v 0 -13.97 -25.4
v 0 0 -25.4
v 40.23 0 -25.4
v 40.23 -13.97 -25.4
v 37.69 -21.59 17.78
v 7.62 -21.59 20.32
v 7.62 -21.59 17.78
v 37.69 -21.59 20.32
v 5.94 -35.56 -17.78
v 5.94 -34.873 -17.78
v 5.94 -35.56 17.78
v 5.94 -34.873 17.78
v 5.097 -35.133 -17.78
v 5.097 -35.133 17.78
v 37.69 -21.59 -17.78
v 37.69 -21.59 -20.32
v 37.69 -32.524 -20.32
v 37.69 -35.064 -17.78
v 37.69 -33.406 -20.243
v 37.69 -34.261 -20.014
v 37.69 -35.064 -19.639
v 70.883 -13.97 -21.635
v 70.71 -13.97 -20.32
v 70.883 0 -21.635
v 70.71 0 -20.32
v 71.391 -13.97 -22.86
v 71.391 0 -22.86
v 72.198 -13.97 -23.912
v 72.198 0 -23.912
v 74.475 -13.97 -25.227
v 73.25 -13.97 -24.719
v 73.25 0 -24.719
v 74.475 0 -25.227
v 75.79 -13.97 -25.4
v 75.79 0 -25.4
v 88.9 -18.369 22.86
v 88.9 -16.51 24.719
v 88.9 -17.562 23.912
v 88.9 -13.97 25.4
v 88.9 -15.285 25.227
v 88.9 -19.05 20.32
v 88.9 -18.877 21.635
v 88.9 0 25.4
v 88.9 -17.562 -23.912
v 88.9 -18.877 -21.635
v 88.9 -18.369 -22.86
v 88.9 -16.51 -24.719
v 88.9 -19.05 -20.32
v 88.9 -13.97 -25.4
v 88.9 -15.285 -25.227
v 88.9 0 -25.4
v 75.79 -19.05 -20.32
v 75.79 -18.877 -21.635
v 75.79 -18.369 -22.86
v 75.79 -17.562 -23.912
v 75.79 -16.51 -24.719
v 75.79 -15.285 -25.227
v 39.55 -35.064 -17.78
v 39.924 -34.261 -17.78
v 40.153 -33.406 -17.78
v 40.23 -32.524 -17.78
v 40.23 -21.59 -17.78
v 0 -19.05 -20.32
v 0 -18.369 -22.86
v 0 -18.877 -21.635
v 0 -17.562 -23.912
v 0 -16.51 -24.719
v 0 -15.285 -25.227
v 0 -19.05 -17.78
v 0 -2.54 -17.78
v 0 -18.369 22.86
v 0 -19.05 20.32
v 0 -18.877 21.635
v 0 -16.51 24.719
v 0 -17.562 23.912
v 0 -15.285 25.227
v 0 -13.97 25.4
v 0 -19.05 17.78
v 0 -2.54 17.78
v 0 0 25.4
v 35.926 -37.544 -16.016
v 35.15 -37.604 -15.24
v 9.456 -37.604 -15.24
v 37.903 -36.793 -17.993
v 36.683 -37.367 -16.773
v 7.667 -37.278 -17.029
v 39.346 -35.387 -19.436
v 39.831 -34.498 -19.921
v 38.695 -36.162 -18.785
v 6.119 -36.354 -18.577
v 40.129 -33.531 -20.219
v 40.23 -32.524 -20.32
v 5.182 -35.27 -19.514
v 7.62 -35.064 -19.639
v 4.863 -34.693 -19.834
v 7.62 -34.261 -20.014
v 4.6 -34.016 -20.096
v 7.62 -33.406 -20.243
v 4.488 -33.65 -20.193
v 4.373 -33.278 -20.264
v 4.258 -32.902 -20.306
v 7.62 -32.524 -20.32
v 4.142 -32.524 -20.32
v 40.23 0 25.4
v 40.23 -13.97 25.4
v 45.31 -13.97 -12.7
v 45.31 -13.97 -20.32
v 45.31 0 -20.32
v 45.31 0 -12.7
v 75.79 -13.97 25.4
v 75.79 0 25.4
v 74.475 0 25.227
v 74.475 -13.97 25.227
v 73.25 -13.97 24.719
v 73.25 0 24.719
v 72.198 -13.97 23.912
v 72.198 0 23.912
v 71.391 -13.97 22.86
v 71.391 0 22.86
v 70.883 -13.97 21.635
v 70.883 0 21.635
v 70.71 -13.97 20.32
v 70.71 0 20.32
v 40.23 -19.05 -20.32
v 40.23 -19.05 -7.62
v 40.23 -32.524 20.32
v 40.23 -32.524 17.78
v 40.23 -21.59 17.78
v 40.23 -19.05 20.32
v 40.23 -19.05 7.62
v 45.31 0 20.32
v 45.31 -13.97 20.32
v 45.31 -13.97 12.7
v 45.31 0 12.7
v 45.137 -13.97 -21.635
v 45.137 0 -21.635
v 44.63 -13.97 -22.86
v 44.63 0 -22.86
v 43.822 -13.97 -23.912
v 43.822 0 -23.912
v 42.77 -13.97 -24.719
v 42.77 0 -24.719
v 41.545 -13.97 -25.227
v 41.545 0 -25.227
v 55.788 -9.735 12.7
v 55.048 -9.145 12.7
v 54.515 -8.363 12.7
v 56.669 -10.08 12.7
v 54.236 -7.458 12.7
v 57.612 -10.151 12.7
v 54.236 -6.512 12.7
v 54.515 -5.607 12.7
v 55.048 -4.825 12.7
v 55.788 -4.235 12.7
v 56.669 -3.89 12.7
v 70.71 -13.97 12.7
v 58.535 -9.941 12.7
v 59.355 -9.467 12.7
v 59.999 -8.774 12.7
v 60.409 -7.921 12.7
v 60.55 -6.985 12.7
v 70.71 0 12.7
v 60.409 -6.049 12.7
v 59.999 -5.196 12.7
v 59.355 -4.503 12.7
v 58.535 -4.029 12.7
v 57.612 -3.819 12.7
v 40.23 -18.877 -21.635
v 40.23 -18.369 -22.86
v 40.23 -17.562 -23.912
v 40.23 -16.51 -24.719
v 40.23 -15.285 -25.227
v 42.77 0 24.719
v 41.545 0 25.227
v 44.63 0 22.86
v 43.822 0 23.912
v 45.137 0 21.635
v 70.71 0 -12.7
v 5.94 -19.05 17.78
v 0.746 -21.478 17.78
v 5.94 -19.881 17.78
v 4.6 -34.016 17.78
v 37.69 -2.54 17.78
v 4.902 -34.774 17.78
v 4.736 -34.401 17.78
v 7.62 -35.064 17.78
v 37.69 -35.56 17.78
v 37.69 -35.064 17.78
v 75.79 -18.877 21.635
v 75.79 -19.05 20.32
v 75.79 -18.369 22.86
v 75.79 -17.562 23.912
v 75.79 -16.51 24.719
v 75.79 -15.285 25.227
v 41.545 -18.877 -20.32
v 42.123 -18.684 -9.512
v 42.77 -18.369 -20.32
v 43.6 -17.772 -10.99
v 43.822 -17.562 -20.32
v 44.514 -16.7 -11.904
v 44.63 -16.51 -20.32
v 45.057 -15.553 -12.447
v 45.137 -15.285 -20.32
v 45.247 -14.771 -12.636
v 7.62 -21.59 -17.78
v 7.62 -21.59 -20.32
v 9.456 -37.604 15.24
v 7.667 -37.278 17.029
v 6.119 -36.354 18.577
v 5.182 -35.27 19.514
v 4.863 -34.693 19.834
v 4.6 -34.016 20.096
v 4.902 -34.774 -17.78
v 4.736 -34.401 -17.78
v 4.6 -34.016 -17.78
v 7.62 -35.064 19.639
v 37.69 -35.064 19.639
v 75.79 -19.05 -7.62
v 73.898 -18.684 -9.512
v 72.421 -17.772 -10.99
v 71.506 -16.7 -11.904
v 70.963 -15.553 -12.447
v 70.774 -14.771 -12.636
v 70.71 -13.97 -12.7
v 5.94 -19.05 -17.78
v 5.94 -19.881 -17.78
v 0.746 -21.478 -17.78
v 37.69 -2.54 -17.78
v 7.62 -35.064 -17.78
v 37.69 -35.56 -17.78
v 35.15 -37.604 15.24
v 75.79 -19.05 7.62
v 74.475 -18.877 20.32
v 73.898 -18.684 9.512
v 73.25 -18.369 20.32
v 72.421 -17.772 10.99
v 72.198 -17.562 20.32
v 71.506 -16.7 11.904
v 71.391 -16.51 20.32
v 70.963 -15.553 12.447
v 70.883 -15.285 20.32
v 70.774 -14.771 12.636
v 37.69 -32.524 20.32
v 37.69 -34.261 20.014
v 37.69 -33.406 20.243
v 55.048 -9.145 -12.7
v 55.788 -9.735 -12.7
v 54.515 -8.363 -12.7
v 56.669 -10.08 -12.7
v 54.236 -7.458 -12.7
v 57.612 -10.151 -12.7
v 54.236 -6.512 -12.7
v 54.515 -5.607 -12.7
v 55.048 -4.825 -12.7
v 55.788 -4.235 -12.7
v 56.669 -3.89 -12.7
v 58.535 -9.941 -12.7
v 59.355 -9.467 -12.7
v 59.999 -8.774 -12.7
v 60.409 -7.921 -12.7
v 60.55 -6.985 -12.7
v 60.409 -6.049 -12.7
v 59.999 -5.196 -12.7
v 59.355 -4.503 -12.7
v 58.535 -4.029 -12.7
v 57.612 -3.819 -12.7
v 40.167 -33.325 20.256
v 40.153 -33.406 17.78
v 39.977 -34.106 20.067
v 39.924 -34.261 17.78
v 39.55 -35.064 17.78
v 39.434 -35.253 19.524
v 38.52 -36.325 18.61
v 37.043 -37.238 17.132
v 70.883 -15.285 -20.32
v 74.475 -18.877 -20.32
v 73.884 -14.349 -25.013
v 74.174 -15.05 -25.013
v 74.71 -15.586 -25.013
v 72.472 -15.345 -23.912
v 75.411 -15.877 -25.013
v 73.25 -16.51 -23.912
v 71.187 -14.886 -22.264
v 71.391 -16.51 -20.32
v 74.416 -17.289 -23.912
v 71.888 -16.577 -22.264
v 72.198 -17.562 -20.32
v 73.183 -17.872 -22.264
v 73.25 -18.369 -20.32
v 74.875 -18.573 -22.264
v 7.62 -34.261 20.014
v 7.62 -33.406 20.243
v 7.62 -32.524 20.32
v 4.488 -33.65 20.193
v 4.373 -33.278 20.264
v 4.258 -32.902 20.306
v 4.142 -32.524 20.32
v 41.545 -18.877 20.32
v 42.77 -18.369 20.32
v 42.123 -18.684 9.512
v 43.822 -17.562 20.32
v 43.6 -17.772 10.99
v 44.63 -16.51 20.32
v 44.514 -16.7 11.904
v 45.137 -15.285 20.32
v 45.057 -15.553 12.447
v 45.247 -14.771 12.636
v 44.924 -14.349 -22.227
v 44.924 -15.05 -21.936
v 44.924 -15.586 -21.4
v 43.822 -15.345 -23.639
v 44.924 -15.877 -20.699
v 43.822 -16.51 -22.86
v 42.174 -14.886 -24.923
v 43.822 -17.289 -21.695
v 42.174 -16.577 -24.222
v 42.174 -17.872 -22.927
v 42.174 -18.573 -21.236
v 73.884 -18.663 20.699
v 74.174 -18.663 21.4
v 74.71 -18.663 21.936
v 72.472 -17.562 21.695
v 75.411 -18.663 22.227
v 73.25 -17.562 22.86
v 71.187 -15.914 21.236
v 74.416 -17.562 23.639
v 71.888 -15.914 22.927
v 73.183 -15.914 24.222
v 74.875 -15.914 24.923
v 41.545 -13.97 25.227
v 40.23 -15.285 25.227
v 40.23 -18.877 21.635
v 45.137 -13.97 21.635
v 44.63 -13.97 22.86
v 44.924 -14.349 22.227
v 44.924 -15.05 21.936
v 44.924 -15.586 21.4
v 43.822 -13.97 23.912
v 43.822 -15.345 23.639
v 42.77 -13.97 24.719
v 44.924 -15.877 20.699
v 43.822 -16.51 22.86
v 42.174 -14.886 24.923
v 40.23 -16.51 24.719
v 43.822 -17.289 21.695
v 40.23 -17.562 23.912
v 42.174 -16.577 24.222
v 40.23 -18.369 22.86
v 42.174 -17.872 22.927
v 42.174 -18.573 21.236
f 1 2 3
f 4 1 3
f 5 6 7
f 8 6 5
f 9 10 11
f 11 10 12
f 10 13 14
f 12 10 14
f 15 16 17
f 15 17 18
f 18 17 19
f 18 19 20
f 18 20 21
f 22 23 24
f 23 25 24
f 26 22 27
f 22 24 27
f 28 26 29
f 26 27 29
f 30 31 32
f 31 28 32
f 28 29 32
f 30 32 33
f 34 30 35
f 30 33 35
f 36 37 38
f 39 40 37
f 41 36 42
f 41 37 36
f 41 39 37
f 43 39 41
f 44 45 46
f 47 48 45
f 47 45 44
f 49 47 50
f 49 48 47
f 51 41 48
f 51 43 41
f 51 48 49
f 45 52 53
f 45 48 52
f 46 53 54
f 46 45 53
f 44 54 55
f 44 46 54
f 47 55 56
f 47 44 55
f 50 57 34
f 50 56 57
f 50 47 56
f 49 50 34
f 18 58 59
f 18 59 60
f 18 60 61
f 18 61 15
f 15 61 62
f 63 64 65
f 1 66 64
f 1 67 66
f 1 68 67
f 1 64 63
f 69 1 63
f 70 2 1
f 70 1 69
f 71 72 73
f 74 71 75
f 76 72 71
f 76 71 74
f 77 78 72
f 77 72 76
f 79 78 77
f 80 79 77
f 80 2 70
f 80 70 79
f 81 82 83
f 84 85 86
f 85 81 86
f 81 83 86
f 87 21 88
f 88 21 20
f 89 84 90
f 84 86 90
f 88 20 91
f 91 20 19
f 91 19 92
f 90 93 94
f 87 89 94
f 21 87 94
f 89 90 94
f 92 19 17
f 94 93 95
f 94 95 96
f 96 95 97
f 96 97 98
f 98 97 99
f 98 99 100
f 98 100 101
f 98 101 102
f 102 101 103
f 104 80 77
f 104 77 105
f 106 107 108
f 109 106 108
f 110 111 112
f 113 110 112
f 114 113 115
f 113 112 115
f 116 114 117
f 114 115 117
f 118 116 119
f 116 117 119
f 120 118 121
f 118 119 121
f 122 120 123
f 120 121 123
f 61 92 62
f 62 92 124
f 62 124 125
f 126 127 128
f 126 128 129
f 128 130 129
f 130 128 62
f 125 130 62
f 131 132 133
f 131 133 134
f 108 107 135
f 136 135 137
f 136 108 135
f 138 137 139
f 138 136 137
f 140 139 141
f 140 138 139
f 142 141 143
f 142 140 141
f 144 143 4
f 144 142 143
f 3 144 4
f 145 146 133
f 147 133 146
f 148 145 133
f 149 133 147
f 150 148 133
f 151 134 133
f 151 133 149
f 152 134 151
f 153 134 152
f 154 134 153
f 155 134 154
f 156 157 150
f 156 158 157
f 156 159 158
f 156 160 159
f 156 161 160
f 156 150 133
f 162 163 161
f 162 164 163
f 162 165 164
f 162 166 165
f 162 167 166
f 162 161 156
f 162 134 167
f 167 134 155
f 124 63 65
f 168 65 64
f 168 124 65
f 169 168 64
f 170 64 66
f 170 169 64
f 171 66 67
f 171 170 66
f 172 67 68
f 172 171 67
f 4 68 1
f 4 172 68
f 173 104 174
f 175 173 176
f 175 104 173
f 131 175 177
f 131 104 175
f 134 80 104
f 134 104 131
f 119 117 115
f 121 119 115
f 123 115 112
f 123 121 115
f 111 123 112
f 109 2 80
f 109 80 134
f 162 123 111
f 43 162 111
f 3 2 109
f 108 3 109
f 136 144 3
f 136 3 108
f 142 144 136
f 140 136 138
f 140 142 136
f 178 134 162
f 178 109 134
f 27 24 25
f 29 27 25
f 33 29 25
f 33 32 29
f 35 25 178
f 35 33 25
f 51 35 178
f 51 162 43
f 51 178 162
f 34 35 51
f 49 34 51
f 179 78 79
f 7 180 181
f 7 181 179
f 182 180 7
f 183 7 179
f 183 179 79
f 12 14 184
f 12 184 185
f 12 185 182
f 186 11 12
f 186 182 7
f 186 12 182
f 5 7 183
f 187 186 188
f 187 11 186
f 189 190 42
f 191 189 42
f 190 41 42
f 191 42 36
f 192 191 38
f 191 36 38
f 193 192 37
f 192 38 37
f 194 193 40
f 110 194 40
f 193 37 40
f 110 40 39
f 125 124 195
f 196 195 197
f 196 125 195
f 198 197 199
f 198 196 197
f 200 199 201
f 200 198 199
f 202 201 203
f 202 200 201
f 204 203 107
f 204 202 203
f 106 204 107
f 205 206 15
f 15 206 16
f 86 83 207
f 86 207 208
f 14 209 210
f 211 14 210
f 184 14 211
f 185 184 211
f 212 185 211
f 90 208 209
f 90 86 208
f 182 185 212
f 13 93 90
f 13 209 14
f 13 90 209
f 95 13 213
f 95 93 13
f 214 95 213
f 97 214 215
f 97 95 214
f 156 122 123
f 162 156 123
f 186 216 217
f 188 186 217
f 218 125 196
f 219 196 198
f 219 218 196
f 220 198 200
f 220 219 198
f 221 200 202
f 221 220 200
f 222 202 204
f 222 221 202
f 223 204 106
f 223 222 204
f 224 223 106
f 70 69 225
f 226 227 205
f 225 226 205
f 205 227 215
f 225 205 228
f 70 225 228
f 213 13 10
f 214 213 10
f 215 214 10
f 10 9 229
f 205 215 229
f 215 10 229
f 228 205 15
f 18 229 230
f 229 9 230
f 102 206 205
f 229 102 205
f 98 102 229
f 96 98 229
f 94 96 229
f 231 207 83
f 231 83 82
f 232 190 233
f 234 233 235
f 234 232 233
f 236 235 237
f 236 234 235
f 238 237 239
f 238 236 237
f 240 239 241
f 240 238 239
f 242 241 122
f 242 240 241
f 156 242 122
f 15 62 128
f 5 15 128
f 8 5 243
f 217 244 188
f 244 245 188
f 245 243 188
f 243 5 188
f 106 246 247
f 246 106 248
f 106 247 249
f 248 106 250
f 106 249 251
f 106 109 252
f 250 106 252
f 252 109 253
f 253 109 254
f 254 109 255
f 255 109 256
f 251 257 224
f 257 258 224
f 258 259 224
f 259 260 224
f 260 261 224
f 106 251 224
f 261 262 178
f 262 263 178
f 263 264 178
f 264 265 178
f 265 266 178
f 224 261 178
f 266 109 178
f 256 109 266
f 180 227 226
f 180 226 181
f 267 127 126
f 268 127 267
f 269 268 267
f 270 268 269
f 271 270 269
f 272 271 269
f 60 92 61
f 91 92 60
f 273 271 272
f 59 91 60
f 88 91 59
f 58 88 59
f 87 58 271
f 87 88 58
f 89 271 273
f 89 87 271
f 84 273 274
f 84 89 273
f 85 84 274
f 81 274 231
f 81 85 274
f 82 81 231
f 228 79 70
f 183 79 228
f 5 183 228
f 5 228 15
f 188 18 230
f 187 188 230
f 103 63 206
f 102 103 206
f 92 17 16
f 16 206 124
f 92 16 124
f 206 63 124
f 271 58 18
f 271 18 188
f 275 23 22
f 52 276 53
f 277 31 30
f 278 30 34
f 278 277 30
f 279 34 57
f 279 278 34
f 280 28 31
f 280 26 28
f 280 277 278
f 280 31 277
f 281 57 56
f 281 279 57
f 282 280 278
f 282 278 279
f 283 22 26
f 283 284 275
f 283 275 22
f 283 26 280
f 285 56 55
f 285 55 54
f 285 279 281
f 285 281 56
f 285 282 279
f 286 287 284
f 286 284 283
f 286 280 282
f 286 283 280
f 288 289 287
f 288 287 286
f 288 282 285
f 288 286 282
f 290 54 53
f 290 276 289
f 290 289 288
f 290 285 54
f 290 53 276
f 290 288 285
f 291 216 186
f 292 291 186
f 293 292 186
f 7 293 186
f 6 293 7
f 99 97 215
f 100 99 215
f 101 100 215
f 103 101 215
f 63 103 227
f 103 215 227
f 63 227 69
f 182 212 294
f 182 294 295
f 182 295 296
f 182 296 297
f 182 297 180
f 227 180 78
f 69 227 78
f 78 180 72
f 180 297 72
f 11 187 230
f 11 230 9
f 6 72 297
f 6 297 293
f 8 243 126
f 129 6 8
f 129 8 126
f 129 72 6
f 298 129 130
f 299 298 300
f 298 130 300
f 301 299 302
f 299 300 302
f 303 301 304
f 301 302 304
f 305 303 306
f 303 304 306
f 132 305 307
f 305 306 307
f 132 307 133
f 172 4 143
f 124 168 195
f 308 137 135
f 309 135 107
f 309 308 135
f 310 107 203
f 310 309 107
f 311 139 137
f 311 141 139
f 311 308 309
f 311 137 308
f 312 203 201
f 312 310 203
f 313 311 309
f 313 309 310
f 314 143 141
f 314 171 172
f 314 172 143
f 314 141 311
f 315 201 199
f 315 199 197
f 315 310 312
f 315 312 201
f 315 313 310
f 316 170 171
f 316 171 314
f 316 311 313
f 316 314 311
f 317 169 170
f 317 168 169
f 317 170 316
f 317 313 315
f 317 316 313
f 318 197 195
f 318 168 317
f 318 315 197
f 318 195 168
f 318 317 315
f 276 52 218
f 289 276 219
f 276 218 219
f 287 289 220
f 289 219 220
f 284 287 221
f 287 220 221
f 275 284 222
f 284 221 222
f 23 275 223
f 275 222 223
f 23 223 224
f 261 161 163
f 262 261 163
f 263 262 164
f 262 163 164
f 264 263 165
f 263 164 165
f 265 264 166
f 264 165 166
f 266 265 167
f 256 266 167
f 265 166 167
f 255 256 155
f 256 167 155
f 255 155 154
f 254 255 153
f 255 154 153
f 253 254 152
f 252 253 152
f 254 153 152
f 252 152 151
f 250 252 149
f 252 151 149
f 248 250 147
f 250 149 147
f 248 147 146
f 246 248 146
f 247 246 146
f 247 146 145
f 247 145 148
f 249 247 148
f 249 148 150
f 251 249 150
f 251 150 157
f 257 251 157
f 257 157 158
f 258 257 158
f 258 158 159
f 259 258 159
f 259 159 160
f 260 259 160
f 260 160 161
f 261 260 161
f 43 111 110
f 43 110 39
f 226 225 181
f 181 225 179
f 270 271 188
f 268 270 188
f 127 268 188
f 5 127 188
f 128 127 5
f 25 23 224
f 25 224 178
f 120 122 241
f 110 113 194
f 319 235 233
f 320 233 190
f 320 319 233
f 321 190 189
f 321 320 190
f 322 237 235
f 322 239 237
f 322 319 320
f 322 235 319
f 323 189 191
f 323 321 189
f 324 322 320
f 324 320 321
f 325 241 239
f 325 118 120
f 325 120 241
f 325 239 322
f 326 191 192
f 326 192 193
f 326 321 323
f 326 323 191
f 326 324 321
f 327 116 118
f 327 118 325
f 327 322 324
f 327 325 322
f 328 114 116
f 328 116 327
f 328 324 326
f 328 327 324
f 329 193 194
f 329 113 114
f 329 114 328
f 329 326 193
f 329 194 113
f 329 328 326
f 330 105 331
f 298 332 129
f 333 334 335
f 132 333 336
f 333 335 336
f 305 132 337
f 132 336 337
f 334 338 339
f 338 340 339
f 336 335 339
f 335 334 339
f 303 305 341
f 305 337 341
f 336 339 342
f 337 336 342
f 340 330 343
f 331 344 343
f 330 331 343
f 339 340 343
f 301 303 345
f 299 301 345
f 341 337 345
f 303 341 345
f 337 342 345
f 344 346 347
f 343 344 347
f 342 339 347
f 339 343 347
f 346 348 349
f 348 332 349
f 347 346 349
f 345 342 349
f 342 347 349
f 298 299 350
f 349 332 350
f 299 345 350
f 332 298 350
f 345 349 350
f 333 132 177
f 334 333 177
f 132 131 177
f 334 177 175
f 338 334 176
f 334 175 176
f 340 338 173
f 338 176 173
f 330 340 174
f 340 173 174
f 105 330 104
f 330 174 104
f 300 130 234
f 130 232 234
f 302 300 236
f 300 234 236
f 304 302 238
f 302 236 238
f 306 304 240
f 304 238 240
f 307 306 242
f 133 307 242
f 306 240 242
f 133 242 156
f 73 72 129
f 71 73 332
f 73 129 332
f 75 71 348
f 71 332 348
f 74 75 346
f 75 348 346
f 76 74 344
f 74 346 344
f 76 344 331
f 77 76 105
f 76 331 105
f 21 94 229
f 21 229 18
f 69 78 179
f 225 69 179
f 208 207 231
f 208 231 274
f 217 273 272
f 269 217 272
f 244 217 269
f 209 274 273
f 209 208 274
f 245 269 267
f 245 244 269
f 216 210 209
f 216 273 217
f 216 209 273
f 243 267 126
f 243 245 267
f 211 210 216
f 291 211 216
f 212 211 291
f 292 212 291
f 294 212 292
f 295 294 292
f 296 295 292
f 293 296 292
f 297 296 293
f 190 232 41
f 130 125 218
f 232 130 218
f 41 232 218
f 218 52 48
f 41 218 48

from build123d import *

# Parameters (mm, degrees)
F0_W         = 88.9
F0_H         = 25.4
F1_DEPTH     = 19.05
F2_W         = 25.4
F2_H         = 19.05
F3_DEPTH     = 12.7
F4_R         = 3.175
F5_DEPTH     = 12.7
F7_R         = 5.08
F8_W         = 37.6902104366
F8_H         = 35.56
F9_DEPTH     = 16.51
F10_W        = 40.2302104366
F10_H        = 40.64
F11_DEPTH    = 18.55363
F12_W        = 31.75
F12_H        = 35.56
F13_DEPTH    = 16.51
F14_W        = 30.0702104366
F14_H        = 13.47363
F15_DEPTH    = 2.54
F16_W        = 30.0702104366
F16_H        = 13.47363
F17_DEPTH    = 2.54
F19_DEPTH    = 50.8
F20_W        = 14.3303479189
F20_H        = 35.56
F21_DEPTH    = 7.62
F22_W        = 13.47363
F22_H        = 35.56
F23_DEPTH    = 5.08
F24_T1_DEPTH = 59.4053934524
F24_T3_DEPTH = 59.927191924
F24_T5_DEPTH = 66.04


# Not quite as in the source:
# - a fillet or chamfer that OpenCascade refuses, or shapes differently, is made with other operations: its cross-section is extruded or revolved along the edge and cut away or added


with BuildPart() as f1:
    # F0 (on Front) → F1 (new body)
    with BuildSketch(Plane.XZ):
        with Locations((44.45, 12.7)):
            Rectangle(F0_W, F0_H)
    extrude(amount=F1_DEPTH)

    # F2 (on face) → F3 (cut)
    with BuildSketch(Plane.XY.offset(25.4)):
        with Locations((58.0102104366, -9.525)):
            Rectangle(F2_W, F2_H)
    extrude(amount=-F3_DEPTH, mode=Mode.SUBTRACT)

    # F4 (on face) → F5 (cut)
    with BuildSketch(Plane.XY.offset(12.7)):
        with Locations((57.3752104366, -6.985)):
            Circle(F4_R)
    extrude(amount=-F5_DEPTH, mode=Mode.SUBTRACT)

    # F6: F1 across plane


with BuildPart() as f1_1:
    add(f1.part)
    add(f1.part.mirror(Plane.XY))

    # F7
    f7_edges = [f1_1.edges().sort_by_distance(p)[0] for p in [
        (22.655105, -19.05, -25.4),
        (22.655105, -19.05, 25.4),
        (45.31021, -9.525, -25.4),
        (45.31021, -19.05, -19.05),
        (70.71021, -19.05, -19.05),
        (70.71021, -9.525, -25.4),
        (70.71021, -9.525, 25.4),
        (70.71021, -19.05, 19.05),
        (45.31021, -9.525, 25.4),
        (45.31021, -19.05, 19.05),
        (58.01021, -19.05, -12.7),
        (58.01021, -19.05, 12.7),
        (79.805105, -19.05, -25.4),
        (79.805105, -19.05, 25.4),
    ]]
    fillet(f7_edges, radius=F7_R)

    # F8 (on face) → F9 (cut)
    with BuildSketch(Plane.XZ.offset(19.05)):
        with Locations((18.8451052183, 0)):
            Rectangle(F8_W, F8_H)
    extrude(amount=-F9_DEPTH, mode=Mode.SUBTRACT)

    # F10 (on face) → F11 (join)
    with BuildSketch(Plane.XZ.offset(19.05)):
        with Locations((20.1151052183, 0)):
            Rectangle(F10_W, F10_H)
    extrude(amount=F11_DEPTH)

    # F12 (on face) → F13 (cut)
    with BuildSketch(Plane(origin=(0, -19.05, 0), x_dir=(-1, 0, 0), z_dir=(0, 1, 0))):
        with Locations((-21.8152104366, 0)):
            Rectangle(F12_W, F12_H)
    extrude(amount=-F13_DEPTH, mode=Mode.SUBTRACT)

    # F14 (on face) → F15 (cut)
    with BuildSketch(Plane(origin=(0, 0, -20.32), x_dir=(1, 0, 0), z_dir=(0, 0, -1))):
        with Locations((22.6551052183, 28.326815)):
            Rectangle(F14_W, F14_H)
    extrude(amount=-F15_DEPTH, mode=Mode.SUBTRACT)

    # F16 (on face) → F17 (cut)
    with BuildSketch(Plane.XY.offset(20.32)):
        with Locations((22.6551052183, -28.326815)):
            Rectangle(F16_W, F16_H)
    extrude(amount=-F17_DEPTH, mode=Mode.SUBTRACT)

    # F18 (on face) → F19 (cut)
    with BuildSketch(Plane.XY.offset(20.32)):
        Polygon((0, -37.60363), (5.7030185126, -37.60363), (0, -19.05), align=None)
    extrude(amount=-F19_DEPTH, mode=Mode.SUBTRACT)

    # F20 (on face) → F21 (cut)
    with BuildSketch(Plane(origin=(-5.3501013979, -1.6445152413, 0), x_dir=(0.293813307, -0.9558628252, 0), z_dir=(-0.9558628252, -0.293813307, 0))):
        with Locations((27.9143607796, 0)):
            Rectangle(F20_W, F20_H)
    extrude(amount=-F21_DEPTH, mode=Mode.SUBTRACT)

    # F22 (on face) → F23 (cut)
    with BuildSketch(Plane.YZ.offset(40.2302104366)):
        with Locations((-28.326815, 0)):
            Rectangle(F22_W, F22_H)
    extrude(amount=-F23_DEPTH, mode=Mode.SUBTRACT)

    # F24: fillet of radius 5.08 on 4 edges, made by hand

    # F24_s2 → F24_t1 (cut)
    with BuildSketch(Plane.XY.offset(-29.7026967262)):
        with BuildLine():
            ThreePointArc((9.4560972031, -37.60363), (6.4374769658, -36.6094997805), (4.600314051, -34.0162015997))
            Line((4.600314051, -34.0162015997), (5.7030185126, -37.60363))
            Line((5.7030185126, -37.60363), (9.4560972031, -37.60363))
        make_face()
    extrude(amount=F24_T1_DEPTH, mode=Mode.SUBTRACT)

    # F24_s4 → F24_t3 (cut)
    with BuildSketch(Plane.YZ.offset(-6.9969814874)):
        with BuildLine():
            ThreePointArc((-37.60363, 15.24), (-36.1157324484, 18.8321024484), (-32.52363, 20.32))
            Line((-32.52363, 20.32), (-37.60363, 20.32))
            Line((-37.60363, 20.32), (-37.60363, 15.24))
        make_face()
        with BuildLine():
            ThreePointArc((-37.60363, -15.24), (-36.1157324484, -18.8321024484), (-32.52363, -20.32))
            Line((-32.52363, -20.32), (-37.60363, -20.32))
            Line((-37.60363, -20.32), (-37.60363, -15.24))
        make_face()
    extrude(amount=F24_T3_DEPTH, mode=Mode.SUBTRACT)

    # F24_s6 → F24_t5 (cut)
    with BuildSketch(Plane.XY.offset(-33.02)):
        with BuildLine():
            ThreePointArc((40.2302104366, -32.52363), (38.742312885, -36.1157324484), (35.1502104366, -37.60363))
            Line((35.1502104366, -37.60363), (40.2302104366, -37.60363))
            Line((40.2302104366, -37.60363), (40.2302104366, -32.52363))
        make_face()
    extrude(amount=F24_T5_DEPTH, mode=Mode.SUBTRACT)


solid = f1_1.part
